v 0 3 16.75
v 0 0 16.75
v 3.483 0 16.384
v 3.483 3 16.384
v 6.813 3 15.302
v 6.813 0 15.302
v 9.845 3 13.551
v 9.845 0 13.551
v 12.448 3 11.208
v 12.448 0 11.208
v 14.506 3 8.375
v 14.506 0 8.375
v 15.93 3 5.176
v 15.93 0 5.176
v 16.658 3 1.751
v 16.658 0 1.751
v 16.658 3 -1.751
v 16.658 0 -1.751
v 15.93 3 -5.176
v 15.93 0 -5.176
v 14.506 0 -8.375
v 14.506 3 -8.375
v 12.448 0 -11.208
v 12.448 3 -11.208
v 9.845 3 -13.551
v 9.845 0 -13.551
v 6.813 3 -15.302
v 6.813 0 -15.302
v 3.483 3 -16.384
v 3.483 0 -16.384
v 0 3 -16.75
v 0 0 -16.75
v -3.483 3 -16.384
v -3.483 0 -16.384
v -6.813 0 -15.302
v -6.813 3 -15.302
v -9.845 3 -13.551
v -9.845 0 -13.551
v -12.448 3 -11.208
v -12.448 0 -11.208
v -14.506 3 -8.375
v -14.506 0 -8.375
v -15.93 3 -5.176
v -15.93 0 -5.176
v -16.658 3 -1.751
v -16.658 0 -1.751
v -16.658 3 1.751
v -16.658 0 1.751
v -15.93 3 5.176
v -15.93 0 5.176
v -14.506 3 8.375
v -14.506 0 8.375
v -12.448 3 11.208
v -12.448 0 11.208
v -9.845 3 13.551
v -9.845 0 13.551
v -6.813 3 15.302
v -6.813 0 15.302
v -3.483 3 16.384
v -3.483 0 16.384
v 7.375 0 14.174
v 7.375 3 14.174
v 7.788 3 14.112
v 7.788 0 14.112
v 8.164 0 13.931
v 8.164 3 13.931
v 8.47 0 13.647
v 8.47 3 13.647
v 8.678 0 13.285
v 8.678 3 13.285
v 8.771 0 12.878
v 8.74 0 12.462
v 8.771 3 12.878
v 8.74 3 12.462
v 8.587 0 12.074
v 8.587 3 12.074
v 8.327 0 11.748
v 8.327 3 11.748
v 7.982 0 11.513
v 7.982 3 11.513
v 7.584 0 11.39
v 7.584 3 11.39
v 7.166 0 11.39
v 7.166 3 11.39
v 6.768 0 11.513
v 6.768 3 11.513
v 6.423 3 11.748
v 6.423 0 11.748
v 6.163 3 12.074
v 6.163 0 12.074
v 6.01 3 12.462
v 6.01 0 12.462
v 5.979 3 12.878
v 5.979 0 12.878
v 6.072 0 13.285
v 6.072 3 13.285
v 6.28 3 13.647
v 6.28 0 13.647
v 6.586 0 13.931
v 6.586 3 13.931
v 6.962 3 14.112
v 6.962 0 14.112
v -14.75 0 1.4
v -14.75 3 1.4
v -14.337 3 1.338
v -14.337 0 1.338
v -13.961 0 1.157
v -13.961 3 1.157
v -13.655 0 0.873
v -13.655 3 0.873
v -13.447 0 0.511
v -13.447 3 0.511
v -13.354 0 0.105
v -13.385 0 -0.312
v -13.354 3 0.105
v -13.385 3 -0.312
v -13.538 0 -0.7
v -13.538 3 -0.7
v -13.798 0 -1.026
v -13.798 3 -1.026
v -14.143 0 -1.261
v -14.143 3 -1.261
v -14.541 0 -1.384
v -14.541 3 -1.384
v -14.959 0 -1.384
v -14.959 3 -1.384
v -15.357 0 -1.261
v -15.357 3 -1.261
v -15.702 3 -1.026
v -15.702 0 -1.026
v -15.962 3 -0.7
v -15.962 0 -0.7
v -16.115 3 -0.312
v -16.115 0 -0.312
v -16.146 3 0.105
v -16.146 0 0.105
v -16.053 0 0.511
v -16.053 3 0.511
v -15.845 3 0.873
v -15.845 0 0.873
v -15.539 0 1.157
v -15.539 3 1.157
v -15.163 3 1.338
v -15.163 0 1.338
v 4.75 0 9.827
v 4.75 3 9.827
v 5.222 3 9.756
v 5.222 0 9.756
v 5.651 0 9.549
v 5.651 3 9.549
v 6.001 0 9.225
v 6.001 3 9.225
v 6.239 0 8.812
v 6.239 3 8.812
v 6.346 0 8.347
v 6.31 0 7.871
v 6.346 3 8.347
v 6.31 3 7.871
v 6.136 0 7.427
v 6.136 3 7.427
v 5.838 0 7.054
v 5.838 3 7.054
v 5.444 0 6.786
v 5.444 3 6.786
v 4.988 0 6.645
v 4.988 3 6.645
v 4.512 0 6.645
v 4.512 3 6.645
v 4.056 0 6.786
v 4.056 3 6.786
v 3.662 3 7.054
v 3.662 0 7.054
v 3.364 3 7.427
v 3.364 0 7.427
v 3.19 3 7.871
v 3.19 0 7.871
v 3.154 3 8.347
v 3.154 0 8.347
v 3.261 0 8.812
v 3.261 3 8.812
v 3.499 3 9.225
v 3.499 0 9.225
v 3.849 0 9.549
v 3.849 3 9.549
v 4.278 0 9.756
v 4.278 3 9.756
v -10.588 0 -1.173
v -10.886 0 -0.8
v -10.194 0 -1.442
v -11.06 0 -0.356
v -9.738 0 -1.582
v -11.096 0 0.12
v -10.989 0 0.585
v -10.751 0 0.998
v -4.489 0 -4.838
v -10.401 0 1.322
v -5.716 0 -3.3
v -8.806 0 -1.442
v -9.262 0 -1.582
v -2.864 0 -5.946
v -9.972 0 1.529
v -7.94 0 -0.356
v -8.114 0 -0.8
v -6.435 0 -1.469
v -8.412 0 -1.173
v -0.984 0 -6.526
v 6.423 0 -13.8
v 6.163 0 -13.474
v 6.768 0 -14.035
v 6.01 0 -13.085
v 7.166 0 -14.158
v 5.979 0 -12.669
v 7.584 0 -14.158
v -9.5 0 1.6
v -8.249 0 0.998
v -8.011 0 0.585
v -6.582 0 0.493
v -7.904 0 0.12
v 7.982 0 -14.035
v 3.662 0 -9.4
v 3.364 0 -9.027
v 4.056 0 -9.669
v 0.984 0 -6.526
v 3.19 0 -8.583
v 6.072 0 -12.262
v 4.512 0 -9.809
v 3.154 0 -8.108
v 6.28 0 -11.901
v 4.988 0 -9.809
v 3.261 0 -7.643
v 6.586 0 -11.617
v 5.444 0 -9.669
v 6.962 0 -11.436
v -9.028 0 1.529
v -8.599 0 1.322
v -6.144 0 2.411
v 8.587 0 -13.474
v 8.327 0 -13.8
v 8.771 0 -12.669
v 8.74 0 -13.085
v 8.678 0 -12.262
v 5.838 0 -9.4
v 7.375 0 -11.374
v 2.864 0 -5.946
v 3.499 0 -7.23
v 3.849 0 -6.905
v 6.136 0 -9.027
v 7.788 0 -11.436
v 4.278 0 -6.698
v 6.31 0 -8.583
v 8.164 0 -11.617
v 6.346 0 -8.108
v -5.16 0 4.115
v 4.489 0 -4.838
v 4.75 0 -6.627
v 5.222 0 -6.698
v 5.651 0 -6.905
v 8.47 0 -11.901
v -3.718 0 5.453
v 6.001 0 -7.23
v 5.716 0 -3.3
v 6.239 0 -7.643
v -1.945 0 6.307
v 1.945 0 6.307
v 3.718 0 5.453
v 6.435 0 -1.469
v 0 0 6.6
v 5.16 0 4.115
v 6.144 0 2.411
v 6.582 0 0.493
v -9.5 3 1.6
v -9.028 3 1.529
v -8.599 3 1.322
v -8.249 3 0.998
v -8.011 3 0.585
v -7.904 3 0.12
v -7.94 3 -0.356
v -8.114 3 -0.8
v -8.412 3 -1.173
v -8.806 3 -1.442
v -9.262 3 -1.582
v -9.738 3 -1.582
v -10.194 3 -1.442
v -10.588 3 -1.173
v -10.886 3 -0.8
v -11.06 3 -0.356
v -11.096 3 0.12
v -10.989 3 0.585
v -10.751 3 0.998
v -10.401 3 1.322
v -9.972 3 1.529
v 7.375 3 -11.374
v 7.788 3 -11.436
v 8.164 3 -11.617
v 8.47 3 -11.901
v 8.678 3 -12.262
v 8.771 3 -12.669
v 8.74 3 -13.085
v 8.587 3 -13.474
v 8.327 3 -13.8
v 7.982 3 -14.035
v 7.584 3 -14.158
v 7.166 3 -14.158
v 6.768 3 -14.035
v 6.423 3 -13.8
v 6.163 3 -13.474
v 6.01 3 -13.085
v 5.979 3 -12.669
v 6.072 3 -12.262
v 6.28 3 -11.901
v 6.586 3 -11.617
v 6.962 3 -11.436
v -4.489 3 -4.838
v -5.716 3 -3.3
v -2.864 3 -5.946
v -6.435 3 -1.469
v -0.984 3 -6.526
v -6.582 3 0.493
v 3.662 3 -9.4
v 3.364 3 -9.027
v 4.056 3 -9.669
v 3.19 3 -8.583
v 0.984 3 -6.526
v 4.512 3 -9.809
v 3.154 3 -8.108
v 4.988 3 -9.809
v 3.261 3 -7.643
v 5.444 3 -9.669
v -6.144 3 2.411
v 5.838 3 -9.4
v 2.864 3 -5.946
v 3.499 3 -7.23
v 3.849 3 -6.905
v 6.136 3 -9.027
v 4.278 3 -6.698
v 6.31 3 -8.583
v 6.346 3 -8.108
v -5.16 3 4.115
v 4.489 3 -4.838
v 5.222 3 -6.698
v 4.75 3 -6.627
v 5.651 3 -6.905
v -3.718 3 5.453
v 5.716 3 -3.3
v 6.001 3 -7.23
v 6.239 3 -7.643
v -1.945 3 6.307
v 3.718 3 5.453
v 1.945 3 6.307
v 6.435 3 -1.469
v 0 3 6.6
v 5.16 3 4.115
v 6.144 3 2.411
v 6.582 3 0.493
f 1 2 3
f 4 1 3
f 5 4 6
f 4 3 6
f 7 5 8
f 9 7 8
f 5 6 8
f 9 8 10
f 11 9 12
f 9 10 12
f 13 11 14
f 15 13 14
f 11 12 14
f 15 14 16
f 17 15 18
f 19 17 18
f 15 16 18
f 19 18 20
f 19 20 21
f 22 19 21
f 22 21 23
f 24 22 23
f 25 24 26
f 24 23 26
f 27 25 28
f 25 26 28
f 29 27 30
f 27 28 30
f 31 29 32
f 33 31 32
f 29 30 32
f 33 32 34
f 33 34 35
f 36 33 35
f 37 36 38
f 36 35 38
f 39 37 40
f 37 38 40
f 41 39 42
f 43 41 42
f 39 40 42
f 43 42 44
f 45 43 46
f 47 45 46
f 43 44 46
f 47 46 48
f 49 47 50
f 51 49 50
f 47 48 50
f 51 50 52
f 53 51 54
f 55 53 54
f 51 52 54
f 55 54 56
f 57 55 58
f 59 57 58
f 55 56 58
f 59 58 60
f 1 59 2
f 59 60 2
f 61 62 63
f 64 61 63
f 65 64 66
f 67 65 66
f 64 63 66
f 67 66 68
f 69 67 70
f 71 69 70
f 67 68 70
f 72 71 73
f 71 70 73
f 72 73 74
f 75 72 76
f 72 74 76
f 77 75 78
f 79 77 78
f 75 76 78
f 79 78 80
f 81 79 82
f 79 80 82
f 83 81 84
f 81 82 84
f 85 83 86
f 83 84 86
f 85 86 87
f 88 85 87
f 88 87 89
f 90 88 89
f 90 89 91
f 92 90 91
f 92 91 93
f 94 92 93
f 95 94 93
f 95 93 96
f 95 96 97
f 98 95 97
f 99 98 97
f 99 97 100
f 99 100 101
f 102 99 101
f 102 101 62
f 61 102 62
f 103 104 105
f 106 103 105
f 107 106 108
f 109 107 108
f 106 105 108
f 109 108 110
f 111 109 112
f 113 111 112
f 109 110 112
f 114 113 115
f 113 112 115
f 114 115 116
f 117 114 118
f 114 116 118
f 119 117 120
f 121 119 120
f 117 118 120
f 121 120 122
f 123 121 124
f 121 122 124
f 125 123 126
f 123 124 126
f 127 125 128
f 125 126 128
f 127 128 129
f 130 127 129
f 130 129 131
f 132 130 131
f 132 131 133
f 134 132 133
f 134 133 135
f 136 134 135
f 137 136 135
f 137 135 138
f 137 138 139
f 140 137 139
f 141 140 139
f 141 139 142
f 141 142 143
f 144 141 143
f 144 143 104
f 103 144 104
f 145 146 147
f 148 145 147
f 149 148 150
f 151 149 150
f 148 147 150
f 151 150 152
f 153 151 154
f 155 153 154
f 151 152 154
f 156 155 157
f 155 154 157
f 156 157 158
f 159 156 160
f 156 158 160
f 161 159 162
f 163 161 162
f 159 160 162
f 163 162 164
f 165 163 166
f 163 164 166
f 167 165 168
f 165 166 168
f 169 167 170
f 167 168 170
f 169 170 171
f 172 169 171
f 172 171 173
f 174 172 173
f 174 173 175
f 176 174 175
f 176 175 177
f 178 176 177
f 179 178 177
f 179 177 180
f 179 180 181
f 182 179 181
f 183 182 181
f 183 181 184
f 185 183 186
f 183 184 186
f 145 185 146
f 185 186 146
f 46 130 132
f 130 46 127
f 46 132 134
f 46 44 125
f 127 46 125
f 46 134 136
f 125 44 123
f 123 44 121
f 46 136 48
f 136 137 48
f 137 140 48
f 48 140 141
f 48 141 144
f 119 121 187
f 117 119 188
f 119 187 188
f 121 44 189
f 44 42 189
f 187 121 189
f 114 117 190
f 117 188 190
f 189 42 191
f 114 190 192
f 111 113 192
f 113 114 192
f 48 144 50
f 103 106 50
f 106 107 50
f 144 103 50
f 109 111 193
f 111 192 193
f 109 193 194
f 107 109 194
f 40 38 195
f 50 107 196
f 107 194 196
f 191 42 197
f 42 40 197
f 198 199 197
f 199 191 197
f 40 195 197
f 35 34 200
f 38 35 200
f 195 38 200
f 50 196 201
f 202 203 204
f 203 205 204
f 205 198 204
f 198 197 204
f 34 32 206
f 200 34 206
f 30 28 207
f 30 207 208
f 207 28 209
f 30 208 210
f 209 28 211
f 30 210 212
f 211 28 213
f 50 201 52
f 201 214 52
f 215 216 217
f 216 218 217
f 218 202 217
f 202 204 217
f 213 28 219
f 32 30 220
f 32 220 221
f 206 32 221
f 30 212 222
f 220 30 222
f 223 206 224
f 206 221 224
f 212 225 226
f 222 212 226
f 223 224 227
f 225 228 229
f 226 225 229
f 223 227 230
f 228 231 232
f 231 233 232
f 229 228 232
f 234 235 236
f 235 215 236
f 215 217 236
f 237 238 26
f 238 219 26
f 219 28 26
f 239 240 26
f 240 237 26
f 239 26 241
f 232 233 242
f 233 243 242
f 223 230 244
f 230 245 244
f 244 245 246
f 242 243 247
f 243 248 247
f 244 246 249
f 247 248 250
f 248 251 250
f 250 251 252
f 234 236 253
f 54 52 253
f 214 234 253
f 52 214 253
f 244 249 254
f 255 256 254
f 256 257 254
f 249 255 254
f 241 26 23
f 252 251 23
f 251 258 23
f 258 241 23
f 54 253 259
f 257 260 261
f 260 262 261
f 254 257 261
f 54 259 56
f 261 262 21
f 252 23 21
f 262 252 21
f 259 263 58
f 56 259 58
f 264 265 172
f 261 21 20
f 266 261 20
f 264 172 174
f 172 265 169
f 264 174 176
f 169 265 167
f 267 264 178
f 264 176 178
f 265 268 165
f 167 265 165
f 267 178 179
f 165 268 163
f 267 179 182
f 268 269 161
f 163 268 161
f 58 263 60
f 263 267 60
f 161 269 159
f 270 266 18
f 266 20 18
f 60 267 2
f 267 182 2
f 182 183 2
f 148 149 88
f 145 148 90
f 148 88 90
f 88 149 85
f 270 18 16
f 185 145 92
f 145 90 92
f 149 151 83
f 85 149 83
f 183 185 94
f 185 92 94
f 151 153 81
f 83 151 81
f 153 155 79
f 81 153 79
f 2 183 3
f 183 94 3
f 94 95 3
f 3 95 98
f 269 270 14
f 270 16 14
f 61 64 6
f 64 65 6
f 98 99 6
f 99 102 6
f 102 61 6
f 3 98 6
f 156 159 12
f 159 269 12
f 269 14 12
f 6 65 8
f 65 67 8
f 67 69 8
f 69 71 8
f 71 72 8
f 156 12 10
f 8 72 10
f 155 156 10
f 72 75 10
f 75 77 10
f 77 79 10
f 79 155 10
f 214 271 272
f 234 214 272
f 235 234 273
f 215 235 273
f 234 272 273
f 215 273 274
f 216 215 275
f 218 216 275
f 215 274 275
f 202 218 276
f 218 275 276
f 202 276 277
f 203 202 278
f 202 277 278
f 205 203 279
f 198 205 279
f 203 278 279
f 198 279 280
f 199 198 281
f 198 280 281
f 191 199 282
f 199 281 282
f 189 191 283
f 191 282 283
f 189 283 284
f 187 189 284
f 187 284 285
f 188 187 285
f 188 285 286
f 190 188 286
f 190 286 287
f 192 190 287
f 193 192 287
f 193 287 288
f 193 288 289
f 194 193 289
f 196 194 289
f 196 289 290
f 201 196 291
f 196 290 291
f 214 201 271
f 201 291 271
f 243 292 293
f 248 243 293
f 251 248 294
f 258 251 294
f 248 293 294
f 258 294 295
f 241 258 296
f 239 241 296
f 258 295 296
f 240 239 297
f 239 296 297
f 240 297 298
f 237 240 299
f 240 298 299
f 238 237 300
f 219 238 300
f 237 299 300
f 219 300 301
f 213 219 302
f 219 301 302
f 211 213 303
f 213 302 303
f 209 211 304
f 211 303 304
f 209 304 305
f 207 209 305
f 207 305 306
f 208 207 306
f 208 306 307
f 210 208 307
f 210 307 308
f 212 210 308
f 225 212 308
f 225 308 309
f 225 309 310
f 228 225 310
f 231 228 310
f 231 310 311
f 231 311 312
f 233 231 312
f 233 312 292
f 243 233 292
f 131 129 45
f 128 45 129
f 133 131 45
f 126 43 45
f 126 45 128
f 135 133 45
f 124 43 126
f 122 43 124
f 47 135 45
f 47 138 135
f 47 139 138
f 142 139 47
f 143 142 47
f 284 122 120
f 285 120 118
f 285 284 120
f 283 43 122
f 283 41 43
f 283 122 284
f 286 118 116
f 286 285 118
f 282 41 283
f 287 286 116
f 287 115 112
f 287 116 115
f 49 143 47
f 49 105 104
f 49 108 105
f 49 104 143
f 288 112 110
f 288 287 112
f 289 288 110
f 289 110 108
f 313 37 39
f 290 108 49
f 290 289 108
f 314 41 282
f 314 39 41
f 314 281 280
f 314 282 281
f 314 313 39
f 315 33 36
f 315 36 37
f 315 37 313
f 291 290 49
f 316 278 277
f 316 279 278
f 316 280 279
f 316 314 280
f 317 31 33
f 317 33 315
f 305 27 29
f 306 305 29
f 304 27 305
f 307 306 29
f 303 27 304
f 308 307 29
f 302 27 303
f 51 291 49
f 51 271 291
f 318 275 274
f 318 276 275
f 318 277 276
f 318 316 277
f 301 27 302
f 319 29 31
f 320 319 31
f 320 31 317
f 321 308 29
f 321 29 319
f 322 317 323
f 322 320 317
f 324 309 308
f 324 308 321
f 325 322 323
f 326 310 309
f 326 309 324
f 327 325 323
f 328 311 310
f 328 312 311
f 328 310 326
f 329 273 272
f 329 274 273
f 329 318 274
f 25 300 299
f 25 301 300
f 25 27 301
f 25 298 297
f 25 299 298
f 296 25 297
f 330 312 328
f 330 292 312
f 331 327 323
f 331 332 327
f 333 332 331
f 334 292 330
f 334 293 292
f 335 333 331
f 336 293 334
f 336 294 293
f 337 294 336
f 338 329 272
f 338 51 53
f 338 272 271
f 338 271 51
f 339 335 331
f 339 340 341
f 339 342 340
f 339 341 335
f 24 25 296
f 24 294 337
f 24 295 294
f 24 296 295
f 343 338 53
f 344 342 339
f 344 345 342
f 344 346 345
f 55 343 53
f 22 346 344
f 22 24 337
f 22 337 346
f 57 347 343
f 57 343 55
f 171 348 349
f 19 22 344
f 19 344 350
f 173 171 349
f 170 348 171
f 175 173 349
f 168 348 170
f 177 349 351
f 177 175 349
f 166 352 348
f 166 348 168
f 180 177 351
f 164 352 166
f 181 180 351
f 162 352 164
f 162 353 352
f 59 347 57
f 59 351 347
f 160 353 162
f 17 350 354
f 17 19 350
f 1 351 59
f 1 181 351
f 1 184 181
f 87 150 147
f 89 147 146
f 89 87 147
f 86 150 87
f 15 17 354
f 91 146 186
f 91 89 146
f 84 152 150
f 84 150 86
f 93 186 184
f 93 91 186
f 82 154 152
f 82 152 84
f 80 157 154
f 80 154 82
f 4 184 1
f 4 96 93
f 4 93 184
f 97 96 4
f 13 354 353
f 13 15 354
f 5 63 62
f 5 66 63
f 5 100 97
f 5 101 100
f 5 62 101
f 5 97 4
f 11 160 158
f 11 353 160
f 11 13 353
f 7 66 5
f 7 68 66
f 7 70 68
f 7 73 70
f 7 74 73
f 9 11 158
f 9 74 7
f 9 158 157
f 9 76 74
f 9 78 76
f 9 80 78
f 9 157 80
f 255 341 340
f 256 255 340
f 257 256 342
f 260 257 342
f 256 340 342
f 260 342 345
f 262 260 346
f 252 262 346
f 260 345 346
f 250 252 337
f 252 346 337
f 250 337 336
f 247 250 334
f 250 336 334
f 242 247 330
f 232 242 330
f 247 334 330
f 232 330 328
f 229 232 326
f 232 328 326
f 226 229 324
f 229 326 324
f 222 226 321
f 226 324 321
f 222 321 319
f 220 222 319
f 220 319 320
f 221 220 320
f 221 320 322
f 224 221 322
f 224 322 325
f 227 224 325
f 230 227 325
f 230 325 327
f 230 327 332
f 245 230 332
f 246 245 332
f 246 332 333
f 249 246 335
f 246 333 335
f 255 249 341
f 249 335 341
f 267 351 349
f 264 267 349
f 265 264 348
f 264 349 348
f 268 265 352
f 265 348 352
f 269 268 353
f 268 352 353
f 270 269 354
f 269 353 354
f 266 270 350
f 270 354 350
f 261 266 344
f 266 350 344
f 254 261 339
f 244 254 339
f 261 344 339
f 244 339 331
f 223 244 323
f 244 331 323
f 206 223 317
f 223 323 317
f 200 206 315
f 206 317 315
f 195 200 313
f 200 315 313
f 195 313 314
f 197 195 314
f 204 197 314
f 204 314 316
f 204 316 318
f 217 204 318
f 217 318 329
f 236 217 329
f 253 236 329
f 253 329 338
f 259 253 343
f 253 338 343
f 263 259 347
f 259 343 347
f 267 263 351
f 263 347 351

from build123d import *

# Parameters (mm, degrees)
SKETCH_1_R          = 16.75
EXTRUDE_1_DEPTH     = 3
SKETCH_2_R          = 1.6
CUT_EXTRUDE_1_DEPTH = 3
SKETCH_3_R          = 6.6
CUT_EXTRUDE_2_DEPTH = 3
SKETCH_4_R          = 1.4
CUT_EXTRUDE_3_DEPTH = 10


with BuildPart() as part:
    # 草图1 → 凸台-拉伸1 (new body)
    with BuildSketch(Plane(origin=(0, 0, 0), x_dir=(1, 0, 0), z_dir=(0, 1, 0))):
        with Locations(Location((0, 0, 0), (0, 0, 270))):
            Circle(SKETCH_1_R)
    extrude(amount=EXTRUDE_1_DEPTH)

    # 草图2 → 切除-拉伸1 (cut)
    with BuildSketch(Plane(origin=(0, 3, 0), x_dir=(1, 0, 0), z_dir=(0, 1, 0))):
        with Locations(Location((4.75, 8.227241336, 0), (0, 0, 270))):
            Circle(SKETCH_2_R)
        with Locations(Location((4.75, -8.227241336, 0), (0, 0, 270))):
            Circle(SKETCH_2_R)
        with Locations(Location((-9.5, 0, 0), (0, 0, 270))):
            Circle(SKETCH_2_R)
    extrude(amount=-CUT_EXTRUDE_1_DEPTH, mode=Mode.SUBTRACT)

    # 草图3 → 切除-拉伸2 (cut)
    with BuildSketch(Plane(origin=(0, 3, 0), x_dir=(1, 0, 0), z_dir=(0, 1, 0))):
        with Locations(Location((0, 0, 0), (0, 0, 270))):
            Circle(SKETCH_3_R)
    extrude(amount=-CUT_EXTRUDE_2_DEPTH, mode=Mode.SUBTRACT)

    # 草图4 → 切除-拉伸3 (cut)
    with BuildSketch(Plane(origin=(0, 3, 0), x_dir=(1, 0, 0), z_dir=(0, 1, 0))):
        with Locations(Location((-14.75, 0, 0), (0, 0, 270))):
            Circle(SKETCH_4_R)
        with Locations(Location((7.375, 12.773874706, 0), (0, 0, 270))):
            Circle(SKETCH_4_R)
        with Locations(Location((7.375, -12.773874706, 0), (0, 0, 270))):
            Circle(SKETCH_4_R)
    extrude(amount=-CUT_EXTRUDE_3_DEPTH, mode=Mode.SUBTRACT)


solid = part.part
